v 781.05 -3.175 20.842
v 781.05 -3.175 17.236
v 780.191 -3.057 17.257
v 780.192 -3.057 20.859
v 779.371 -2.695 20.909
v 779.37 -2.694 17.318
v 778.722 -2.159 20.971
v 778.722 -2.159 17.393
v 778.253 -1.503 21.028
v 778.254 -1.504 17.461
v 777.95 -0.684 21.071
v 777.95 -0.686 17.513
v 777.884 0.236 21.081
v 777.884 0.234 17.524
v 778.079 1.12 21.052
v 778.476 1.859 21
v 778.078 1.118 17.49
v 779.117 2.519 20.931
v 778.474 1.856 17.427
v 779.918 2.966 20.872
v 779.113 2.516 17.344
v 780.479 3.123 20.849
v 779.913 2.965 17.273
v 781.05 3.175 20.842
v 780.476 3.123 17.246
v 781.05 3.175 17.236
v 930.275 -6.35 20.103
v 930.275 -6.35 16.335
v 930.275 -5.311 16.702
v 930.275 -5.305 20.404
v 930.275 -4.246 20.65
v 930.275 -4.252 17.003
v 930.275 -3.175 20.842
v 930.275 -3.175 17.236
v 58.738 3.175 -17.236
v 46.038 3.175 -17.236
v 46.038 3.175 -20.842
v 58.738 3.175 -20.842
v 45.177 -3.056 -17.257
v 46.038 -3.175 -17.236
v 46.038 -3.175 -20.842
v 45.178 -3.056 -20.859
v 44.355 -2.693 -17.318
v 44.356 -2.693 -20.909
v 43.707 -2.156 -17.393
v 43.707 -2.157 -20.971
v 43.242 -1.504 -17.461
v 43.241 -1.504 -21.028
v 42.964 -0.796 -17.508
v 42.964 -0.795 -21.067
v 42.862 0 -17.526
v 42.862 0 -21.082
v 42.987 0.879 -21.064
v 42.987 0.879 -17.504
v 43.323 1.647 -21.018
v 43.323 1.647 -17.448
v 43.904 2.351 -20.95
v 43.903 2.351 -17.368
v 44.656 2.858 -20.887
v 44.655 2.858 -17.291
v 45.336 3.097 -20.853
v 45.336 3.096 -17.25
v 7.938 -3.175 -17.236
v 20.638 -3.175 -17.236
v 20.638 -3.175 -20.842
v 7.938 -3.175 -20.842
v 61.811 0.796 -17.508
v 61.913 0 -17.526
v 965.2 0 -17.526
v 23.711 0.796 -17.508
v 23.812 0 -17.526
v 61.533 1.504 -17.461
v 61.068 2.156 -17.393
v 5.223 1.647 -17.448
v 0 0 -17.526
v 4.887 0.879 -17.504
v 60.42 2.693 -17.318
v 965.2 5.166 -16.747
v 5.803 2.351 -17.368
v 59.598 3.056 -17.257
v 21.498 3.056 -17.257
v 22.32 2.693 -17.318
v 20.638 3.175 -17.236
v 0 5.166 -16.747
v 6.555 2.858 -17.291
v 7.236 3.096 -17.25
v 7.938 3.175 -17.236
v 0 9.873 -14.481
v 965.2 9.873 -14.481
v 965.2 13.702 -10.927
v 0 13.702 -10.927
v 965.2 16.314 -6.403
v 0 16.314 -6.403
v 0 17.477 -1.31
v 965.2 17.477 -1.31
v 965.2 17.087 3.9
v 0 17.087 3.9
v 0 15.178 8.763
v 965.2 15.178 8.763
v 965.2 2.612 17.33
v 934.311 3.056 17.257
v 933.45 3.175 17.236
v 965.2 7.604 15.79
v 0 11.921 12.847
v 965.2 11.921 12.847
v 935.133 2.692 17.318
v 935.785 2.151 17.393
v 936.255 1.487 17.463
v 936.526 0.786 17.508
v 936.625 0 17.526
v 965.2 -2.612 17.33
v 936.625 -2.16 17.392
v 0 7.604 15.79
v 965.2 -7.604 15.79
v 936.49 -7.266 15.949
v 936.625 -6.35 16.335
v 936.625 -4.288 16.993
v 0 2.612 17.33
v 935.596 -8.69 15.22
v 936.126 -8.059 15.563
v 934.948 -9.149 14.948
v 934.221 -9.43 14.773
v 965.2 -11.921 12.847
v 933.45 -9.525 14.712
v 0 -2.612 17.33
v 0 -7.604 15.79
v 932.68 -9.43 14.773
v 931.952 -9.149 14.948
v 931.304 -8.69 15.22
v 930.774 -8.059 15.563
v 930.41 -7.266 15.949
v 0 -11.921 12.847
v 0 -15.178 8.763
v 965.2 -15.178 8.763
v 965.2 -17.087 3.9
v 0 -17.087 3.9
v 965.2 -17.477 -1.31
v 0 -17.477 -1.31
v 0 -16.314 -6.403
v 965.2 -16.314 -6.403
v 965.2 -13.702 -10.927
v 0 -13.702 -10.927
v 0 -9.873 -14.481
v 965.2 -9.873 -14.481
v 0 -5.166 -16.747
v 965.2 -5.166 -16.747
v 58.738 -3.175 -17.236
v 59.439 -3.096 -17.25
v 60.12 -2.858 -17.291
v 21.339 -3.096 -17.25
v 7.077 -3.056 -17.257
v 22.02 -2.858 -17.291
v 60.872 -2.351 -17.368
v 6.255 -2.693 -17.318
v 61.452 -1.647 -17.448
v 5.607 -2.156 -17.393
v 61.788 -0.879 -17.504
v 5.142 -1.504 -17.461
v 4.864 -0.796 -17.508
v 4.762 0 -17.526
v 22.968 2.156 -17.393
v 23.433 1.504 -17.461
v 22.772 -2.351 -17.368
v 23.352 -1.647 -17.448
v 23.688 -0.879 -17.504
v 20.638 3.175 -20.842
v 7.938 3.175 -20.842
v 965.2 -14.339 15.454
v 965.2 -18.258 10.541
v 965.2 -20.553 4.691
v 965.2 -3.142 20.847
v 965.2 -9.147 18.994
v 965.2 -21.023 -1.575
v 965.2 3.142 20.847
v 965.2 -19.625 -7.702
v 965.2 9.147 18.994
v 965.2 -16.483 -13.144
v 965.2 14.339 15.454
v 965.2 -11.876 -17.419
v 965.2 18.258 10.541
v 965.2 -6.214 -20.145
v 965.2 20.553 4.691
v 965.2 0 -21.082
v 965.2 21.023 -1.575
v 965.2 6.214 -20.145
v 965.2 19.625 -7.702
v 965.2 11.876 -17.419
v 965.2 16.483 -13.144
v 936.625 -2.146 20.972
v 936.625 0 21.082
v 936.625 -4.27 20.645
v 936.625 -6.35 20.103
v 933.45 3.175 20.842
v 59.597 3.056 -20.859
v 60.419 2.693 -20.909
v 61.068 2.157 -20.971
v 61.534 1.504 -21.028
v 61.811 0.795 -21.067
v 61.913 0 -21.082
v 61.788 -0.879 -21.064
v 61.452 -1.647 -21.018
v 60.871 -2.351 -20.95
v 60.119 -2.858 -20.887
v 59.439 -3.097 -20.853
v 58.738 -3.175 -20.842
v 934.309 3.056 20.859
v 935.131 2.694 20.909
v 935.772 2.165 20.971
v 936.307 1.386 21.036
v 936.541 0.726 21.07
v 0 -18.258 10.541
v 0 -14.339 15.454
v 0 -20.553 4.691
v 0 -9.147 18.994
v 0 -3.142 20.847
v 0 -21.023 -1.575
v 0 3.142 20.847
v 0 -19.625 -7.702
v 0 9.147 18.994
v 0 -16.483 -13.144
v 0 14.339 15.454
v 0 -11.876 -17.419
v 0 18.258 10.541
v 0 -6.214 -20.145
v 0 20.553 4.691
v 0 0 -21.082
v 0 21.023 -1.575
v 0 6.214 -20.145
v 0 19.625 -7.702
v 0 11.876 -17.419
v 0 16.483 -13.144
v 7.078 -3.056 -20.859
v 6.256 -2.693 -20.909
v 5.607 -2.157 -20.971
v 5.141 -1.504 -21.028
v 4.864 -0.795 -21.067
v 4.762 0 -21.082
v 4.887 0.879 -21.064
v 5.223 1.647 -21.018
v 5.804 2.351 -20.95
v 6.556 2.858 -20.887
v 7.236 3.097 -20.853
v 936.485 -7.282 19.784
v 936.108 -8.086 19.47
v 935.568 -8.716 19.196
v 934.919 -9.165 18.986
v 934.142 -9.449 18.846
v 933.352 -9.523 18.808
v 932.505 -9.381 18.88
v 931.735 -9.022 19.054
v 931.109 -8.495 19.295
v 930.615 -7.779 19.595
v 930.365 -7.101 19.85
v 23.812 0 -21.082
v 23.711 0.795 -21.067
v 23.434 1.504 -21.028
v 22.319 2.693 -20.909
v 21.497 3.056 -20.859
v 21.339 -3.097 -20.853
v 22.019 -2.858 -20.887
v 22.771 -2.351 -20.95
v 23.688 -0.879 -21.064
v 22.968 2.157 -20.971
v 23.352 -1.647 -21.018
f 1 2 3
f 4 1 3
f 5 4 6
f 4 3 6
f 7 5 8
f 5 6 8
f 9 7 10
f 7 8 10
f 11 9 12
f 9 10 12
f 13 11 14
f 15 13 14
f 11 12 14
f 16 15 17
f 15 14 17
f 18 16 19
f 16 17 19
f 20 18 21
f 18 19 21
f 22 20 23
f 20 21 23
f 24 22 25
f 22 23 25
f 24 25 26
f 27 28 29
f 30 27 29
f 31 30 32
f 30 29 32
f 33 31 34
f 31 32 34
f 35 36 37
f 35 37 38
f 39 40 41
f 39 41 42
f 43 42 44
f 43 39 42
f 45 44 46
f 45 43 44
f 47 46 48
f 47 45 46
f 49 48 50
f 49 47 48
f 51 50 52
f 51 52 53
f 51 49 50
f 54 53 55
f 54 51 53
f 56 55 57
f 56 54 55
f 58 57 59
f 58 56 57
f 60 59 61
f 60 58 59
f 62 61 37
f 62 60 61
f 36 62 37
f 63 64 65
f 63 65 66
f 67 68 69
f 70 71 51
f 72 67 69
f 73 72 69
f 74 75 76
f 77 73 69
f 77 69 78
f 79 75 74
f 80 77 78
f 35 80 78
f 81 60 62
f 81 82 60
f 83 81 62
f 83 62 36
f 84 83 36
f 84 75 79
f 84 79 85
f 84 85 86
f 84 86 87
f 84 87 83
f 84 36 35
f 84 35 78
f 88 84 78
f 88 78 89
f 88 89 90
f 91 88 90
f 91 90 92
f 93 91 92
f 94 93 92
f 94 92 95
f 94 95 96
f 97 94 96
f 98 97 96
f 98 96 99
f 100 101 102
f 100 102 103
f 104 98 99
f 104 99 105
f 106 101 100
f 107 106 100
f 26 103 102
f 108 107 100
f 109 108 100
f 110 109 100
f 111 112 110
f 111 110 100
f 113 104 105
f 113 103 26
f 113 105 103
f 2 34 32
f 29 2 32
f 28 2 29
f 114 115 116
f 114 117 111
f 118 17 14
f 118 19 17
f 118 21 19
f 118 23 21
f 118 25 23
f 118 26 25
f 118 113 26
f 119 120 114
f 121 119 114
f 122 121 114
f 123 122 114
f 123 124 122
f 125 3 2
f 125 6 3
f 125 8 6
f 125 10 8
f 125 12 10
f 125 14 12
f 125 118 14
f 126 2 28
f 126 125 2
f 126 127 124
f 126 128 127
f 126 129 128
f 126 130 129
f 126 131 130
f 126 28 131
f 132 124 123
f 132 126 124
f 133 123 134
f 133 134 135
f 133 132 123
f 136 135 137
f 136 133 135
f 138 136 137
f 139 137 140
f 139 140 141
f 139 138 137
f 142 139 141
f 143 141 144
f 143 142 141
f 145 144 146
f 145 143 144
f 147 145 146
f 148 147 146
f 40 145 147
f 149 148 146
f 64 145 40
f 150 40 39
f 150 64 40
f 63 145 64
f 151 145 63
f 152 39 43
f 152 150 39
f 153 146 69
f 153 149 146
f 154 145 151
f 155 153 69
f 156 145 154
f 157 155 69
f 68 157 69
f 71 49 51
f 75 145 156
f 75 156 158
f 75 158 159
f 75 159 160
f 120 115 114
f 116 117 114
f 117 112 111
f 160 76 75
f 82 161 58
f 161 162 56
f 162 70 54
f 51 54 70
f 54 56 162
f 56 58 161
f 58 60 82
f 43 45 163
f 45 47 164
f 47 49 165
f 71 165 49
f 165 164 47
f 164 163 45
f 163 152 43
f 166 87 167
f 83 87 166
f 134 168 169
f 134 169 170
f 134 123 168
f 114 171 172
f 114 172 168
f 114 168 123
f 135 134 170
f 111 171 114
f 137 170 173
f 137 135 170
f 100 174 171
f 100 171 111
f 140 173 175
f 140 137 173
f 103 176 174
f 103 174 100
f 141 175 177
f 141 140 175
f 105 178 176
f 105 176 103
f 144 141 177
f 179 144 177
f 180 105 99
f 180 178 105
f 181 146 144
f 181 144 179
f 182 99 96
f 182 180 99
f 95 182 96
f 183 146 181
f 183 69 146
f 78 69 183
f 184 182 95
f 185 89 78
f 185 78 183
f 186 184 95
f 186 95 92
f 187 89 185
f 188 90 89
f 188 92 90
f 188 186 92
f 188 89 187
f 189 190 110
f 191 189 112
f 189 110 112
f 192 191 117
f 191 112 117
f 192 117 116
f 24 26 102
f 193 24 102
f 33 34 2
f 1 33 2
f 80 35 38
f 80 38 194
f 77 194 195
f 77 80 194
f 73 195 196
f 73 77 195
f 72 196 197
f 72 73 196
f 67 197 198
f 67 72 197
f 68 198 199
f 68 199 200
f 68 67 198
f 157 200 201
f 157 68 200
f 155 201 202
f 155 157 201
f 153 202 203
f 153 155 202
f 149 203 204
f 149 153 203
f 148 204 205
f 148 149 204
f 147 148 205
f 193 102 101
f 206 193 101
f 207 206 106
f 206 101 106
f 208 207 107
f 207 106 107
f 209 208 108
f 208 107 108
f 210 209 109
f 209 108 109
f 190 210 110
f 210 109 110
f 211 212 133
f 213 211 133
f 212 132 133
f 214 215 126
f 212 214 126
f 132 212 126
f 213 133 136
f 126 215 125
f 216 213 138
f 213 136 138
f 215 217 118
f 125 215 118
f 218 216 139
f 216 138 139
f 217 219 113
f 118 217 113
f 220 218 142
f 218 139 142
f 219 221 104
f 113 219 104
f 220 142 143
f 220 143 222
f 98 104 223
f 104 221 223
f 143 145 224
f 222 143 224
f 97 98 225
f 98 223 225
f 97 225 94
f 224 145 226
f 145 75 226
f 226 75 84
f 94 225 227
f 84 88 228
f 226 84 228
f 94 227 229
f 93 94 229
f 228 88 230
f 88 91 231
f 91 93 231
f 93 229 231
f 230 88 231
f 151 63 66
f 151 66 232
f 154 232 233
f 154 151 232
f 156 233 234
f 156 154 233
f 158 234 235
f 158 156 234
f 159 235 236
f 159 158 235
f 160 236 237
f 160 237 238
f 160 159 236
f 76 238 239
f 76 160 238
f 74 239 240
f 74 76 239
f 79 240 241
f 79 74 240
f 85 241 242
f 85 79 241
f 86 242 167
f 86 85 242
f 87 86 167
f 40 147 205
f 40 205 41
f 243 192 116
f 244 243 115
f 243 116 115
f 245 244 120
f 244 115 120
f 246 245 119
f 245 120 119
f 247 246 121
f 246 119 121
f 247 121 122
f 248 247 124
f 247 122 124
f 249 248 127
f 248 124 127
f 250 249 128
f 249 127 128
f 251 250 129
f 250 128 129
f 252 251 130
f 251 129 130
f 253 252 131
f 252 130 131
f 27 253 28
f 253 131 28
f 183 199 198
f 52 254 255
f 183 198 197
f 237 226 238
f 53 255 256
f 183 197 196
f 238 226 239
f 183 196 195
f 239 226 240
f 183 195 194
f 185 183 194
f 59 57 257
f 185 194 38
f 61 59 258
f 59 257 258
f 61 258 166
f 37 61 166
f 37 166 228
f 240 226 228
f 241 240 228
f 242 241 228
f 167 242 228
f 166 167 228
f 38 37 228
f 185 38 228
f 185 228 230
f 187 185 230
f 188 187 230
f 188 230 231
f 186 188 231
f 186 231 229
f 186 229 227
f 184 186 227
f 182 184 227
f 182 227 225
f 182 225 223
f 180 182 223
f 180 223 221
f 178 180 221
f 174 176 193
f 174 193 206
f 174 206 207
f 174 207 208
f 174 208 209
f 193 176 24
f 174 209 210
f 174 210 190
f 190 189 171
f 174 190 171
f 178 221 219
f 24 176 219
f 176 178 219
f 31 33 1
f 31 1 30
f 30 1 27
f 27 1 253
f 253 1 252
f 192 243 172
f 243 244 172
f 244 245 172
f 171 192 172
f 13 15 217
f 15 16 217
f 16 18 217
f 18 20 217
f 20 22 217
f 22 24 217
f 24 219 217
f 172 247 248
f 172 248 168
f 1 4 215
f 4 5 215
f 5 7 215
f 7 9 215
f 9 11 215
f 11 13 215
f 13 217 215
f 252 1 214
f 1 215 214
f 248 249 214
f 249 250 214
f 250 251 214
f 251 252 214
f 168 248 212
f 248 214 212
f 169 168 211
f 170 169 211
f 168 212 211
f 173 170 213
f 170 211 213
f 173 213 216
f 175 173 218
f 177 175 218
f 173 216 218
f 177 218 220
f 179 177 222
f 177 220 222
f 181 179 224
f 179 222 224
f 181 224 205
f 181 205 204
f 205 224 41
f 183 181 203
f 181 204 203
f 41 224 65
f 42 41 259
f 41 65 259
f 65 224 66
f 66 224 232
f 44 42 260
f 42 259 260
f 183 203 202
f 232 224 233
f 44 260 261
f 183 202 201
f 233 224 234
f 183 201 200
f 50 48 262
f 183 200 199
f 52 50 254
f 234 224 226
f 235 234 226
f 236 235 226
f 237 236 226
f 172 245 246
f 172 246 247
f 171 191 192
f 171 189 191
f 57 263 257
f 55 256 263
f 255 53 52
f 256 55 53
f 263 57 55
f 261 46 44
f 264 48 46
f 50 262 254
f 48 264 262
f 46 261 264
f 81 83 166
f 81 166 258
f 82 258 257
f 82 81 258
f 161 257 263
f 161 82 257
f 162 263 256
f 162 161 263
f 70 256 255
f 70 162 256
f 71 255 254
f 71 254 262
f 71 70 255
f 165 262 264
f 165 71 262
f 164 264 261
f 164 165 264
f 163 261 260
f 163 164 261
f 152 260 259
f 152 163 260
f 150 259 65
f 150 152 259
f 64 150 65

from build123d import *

# Parameters (mm, degrees)
SKETCH1_R           = 21.082
SKETCH1_R_2         = 17.526
BOSS_EXTRUDE1_DEPTH = 965.2
CUT_EXTRUDE1_DEPTH  = 22.082
CUT_EXTRUDE2_DEPTH  = 22.0820001


with BuildPart() as part:
    # Sketch1 → Boss-Extrude1 (new body)
    with BuildSketch(Plane(origin=(0, 0, 0), x_dir=(0, 0, -1), z_dir=(1, 0, 0))):
        Circle(SKETCH1_R)
        Circle(SKETCH1_R_2, mode=Mode.SUBTRACT)
    extrude(amount=BOSS_EXTRUDE1_DEPTH)

    # Sketch2 → Cut-Extrude1 (cut, through all)
    with BuildSketch(Plane.XY):
        with BuildLine():
            Line((7.9375, 3.175), (20.6375, 3.175))
            ThreePointArc((20.6375, 3.175), (23.8125, 0), (20.6375, -3.175))
            Line((20.6375, -3.175), (7.9375, -3.175))
            ThreePointArc((7.9375, -3.175), (4.7625, 0), (7.9375, 3.175))
        make_face()
        with BuildLine():
            Line((46.0375, 3.175), (58.7375, 3.175))
            ThreePointArc((58.7375, 3.175), (61.9125, 0), (58.7375, -3.175))
            Line((58.7375, -3.175), (46.0375, -3.175))
            ThreePointArc((46.0375, -3.175), (42.8625, 0), (46.0375, 3.175))
        make_face()
    extrude(amount=-CUT_EXTRUDE1_DEPTH, mode=Mode.SUBTRACT)

    # Sketch3 → Cut-Extrude2 (cut, through all)
    with BuildSketch(Plane.XY):
        with BuildLine():
            Line((781.05, 3.175), (933.45, 3.175))
            ThreePointArc((933.45, 3.175), (935.69506403, 2.24506403), (936.625, 0))
            Line((936.625, 0), (936.625, -6.35))
            ThreePointArc((936.625, -6.35), (933.45, -9.525), (930.275, -6.35))
            Line((930.275, -6.35), (930.275, -3.175))
            Line((930.275, -3.175), (781.05, -3.175))
            ThreePointArc((781.05, -3.175), (777.875, 0), (781.05, 3.175))
        make_face()
    extrude(amount=CUT_EXTRUDE2_DEPTH, mode=Mode.SUBTRACT)


solid = part.part
